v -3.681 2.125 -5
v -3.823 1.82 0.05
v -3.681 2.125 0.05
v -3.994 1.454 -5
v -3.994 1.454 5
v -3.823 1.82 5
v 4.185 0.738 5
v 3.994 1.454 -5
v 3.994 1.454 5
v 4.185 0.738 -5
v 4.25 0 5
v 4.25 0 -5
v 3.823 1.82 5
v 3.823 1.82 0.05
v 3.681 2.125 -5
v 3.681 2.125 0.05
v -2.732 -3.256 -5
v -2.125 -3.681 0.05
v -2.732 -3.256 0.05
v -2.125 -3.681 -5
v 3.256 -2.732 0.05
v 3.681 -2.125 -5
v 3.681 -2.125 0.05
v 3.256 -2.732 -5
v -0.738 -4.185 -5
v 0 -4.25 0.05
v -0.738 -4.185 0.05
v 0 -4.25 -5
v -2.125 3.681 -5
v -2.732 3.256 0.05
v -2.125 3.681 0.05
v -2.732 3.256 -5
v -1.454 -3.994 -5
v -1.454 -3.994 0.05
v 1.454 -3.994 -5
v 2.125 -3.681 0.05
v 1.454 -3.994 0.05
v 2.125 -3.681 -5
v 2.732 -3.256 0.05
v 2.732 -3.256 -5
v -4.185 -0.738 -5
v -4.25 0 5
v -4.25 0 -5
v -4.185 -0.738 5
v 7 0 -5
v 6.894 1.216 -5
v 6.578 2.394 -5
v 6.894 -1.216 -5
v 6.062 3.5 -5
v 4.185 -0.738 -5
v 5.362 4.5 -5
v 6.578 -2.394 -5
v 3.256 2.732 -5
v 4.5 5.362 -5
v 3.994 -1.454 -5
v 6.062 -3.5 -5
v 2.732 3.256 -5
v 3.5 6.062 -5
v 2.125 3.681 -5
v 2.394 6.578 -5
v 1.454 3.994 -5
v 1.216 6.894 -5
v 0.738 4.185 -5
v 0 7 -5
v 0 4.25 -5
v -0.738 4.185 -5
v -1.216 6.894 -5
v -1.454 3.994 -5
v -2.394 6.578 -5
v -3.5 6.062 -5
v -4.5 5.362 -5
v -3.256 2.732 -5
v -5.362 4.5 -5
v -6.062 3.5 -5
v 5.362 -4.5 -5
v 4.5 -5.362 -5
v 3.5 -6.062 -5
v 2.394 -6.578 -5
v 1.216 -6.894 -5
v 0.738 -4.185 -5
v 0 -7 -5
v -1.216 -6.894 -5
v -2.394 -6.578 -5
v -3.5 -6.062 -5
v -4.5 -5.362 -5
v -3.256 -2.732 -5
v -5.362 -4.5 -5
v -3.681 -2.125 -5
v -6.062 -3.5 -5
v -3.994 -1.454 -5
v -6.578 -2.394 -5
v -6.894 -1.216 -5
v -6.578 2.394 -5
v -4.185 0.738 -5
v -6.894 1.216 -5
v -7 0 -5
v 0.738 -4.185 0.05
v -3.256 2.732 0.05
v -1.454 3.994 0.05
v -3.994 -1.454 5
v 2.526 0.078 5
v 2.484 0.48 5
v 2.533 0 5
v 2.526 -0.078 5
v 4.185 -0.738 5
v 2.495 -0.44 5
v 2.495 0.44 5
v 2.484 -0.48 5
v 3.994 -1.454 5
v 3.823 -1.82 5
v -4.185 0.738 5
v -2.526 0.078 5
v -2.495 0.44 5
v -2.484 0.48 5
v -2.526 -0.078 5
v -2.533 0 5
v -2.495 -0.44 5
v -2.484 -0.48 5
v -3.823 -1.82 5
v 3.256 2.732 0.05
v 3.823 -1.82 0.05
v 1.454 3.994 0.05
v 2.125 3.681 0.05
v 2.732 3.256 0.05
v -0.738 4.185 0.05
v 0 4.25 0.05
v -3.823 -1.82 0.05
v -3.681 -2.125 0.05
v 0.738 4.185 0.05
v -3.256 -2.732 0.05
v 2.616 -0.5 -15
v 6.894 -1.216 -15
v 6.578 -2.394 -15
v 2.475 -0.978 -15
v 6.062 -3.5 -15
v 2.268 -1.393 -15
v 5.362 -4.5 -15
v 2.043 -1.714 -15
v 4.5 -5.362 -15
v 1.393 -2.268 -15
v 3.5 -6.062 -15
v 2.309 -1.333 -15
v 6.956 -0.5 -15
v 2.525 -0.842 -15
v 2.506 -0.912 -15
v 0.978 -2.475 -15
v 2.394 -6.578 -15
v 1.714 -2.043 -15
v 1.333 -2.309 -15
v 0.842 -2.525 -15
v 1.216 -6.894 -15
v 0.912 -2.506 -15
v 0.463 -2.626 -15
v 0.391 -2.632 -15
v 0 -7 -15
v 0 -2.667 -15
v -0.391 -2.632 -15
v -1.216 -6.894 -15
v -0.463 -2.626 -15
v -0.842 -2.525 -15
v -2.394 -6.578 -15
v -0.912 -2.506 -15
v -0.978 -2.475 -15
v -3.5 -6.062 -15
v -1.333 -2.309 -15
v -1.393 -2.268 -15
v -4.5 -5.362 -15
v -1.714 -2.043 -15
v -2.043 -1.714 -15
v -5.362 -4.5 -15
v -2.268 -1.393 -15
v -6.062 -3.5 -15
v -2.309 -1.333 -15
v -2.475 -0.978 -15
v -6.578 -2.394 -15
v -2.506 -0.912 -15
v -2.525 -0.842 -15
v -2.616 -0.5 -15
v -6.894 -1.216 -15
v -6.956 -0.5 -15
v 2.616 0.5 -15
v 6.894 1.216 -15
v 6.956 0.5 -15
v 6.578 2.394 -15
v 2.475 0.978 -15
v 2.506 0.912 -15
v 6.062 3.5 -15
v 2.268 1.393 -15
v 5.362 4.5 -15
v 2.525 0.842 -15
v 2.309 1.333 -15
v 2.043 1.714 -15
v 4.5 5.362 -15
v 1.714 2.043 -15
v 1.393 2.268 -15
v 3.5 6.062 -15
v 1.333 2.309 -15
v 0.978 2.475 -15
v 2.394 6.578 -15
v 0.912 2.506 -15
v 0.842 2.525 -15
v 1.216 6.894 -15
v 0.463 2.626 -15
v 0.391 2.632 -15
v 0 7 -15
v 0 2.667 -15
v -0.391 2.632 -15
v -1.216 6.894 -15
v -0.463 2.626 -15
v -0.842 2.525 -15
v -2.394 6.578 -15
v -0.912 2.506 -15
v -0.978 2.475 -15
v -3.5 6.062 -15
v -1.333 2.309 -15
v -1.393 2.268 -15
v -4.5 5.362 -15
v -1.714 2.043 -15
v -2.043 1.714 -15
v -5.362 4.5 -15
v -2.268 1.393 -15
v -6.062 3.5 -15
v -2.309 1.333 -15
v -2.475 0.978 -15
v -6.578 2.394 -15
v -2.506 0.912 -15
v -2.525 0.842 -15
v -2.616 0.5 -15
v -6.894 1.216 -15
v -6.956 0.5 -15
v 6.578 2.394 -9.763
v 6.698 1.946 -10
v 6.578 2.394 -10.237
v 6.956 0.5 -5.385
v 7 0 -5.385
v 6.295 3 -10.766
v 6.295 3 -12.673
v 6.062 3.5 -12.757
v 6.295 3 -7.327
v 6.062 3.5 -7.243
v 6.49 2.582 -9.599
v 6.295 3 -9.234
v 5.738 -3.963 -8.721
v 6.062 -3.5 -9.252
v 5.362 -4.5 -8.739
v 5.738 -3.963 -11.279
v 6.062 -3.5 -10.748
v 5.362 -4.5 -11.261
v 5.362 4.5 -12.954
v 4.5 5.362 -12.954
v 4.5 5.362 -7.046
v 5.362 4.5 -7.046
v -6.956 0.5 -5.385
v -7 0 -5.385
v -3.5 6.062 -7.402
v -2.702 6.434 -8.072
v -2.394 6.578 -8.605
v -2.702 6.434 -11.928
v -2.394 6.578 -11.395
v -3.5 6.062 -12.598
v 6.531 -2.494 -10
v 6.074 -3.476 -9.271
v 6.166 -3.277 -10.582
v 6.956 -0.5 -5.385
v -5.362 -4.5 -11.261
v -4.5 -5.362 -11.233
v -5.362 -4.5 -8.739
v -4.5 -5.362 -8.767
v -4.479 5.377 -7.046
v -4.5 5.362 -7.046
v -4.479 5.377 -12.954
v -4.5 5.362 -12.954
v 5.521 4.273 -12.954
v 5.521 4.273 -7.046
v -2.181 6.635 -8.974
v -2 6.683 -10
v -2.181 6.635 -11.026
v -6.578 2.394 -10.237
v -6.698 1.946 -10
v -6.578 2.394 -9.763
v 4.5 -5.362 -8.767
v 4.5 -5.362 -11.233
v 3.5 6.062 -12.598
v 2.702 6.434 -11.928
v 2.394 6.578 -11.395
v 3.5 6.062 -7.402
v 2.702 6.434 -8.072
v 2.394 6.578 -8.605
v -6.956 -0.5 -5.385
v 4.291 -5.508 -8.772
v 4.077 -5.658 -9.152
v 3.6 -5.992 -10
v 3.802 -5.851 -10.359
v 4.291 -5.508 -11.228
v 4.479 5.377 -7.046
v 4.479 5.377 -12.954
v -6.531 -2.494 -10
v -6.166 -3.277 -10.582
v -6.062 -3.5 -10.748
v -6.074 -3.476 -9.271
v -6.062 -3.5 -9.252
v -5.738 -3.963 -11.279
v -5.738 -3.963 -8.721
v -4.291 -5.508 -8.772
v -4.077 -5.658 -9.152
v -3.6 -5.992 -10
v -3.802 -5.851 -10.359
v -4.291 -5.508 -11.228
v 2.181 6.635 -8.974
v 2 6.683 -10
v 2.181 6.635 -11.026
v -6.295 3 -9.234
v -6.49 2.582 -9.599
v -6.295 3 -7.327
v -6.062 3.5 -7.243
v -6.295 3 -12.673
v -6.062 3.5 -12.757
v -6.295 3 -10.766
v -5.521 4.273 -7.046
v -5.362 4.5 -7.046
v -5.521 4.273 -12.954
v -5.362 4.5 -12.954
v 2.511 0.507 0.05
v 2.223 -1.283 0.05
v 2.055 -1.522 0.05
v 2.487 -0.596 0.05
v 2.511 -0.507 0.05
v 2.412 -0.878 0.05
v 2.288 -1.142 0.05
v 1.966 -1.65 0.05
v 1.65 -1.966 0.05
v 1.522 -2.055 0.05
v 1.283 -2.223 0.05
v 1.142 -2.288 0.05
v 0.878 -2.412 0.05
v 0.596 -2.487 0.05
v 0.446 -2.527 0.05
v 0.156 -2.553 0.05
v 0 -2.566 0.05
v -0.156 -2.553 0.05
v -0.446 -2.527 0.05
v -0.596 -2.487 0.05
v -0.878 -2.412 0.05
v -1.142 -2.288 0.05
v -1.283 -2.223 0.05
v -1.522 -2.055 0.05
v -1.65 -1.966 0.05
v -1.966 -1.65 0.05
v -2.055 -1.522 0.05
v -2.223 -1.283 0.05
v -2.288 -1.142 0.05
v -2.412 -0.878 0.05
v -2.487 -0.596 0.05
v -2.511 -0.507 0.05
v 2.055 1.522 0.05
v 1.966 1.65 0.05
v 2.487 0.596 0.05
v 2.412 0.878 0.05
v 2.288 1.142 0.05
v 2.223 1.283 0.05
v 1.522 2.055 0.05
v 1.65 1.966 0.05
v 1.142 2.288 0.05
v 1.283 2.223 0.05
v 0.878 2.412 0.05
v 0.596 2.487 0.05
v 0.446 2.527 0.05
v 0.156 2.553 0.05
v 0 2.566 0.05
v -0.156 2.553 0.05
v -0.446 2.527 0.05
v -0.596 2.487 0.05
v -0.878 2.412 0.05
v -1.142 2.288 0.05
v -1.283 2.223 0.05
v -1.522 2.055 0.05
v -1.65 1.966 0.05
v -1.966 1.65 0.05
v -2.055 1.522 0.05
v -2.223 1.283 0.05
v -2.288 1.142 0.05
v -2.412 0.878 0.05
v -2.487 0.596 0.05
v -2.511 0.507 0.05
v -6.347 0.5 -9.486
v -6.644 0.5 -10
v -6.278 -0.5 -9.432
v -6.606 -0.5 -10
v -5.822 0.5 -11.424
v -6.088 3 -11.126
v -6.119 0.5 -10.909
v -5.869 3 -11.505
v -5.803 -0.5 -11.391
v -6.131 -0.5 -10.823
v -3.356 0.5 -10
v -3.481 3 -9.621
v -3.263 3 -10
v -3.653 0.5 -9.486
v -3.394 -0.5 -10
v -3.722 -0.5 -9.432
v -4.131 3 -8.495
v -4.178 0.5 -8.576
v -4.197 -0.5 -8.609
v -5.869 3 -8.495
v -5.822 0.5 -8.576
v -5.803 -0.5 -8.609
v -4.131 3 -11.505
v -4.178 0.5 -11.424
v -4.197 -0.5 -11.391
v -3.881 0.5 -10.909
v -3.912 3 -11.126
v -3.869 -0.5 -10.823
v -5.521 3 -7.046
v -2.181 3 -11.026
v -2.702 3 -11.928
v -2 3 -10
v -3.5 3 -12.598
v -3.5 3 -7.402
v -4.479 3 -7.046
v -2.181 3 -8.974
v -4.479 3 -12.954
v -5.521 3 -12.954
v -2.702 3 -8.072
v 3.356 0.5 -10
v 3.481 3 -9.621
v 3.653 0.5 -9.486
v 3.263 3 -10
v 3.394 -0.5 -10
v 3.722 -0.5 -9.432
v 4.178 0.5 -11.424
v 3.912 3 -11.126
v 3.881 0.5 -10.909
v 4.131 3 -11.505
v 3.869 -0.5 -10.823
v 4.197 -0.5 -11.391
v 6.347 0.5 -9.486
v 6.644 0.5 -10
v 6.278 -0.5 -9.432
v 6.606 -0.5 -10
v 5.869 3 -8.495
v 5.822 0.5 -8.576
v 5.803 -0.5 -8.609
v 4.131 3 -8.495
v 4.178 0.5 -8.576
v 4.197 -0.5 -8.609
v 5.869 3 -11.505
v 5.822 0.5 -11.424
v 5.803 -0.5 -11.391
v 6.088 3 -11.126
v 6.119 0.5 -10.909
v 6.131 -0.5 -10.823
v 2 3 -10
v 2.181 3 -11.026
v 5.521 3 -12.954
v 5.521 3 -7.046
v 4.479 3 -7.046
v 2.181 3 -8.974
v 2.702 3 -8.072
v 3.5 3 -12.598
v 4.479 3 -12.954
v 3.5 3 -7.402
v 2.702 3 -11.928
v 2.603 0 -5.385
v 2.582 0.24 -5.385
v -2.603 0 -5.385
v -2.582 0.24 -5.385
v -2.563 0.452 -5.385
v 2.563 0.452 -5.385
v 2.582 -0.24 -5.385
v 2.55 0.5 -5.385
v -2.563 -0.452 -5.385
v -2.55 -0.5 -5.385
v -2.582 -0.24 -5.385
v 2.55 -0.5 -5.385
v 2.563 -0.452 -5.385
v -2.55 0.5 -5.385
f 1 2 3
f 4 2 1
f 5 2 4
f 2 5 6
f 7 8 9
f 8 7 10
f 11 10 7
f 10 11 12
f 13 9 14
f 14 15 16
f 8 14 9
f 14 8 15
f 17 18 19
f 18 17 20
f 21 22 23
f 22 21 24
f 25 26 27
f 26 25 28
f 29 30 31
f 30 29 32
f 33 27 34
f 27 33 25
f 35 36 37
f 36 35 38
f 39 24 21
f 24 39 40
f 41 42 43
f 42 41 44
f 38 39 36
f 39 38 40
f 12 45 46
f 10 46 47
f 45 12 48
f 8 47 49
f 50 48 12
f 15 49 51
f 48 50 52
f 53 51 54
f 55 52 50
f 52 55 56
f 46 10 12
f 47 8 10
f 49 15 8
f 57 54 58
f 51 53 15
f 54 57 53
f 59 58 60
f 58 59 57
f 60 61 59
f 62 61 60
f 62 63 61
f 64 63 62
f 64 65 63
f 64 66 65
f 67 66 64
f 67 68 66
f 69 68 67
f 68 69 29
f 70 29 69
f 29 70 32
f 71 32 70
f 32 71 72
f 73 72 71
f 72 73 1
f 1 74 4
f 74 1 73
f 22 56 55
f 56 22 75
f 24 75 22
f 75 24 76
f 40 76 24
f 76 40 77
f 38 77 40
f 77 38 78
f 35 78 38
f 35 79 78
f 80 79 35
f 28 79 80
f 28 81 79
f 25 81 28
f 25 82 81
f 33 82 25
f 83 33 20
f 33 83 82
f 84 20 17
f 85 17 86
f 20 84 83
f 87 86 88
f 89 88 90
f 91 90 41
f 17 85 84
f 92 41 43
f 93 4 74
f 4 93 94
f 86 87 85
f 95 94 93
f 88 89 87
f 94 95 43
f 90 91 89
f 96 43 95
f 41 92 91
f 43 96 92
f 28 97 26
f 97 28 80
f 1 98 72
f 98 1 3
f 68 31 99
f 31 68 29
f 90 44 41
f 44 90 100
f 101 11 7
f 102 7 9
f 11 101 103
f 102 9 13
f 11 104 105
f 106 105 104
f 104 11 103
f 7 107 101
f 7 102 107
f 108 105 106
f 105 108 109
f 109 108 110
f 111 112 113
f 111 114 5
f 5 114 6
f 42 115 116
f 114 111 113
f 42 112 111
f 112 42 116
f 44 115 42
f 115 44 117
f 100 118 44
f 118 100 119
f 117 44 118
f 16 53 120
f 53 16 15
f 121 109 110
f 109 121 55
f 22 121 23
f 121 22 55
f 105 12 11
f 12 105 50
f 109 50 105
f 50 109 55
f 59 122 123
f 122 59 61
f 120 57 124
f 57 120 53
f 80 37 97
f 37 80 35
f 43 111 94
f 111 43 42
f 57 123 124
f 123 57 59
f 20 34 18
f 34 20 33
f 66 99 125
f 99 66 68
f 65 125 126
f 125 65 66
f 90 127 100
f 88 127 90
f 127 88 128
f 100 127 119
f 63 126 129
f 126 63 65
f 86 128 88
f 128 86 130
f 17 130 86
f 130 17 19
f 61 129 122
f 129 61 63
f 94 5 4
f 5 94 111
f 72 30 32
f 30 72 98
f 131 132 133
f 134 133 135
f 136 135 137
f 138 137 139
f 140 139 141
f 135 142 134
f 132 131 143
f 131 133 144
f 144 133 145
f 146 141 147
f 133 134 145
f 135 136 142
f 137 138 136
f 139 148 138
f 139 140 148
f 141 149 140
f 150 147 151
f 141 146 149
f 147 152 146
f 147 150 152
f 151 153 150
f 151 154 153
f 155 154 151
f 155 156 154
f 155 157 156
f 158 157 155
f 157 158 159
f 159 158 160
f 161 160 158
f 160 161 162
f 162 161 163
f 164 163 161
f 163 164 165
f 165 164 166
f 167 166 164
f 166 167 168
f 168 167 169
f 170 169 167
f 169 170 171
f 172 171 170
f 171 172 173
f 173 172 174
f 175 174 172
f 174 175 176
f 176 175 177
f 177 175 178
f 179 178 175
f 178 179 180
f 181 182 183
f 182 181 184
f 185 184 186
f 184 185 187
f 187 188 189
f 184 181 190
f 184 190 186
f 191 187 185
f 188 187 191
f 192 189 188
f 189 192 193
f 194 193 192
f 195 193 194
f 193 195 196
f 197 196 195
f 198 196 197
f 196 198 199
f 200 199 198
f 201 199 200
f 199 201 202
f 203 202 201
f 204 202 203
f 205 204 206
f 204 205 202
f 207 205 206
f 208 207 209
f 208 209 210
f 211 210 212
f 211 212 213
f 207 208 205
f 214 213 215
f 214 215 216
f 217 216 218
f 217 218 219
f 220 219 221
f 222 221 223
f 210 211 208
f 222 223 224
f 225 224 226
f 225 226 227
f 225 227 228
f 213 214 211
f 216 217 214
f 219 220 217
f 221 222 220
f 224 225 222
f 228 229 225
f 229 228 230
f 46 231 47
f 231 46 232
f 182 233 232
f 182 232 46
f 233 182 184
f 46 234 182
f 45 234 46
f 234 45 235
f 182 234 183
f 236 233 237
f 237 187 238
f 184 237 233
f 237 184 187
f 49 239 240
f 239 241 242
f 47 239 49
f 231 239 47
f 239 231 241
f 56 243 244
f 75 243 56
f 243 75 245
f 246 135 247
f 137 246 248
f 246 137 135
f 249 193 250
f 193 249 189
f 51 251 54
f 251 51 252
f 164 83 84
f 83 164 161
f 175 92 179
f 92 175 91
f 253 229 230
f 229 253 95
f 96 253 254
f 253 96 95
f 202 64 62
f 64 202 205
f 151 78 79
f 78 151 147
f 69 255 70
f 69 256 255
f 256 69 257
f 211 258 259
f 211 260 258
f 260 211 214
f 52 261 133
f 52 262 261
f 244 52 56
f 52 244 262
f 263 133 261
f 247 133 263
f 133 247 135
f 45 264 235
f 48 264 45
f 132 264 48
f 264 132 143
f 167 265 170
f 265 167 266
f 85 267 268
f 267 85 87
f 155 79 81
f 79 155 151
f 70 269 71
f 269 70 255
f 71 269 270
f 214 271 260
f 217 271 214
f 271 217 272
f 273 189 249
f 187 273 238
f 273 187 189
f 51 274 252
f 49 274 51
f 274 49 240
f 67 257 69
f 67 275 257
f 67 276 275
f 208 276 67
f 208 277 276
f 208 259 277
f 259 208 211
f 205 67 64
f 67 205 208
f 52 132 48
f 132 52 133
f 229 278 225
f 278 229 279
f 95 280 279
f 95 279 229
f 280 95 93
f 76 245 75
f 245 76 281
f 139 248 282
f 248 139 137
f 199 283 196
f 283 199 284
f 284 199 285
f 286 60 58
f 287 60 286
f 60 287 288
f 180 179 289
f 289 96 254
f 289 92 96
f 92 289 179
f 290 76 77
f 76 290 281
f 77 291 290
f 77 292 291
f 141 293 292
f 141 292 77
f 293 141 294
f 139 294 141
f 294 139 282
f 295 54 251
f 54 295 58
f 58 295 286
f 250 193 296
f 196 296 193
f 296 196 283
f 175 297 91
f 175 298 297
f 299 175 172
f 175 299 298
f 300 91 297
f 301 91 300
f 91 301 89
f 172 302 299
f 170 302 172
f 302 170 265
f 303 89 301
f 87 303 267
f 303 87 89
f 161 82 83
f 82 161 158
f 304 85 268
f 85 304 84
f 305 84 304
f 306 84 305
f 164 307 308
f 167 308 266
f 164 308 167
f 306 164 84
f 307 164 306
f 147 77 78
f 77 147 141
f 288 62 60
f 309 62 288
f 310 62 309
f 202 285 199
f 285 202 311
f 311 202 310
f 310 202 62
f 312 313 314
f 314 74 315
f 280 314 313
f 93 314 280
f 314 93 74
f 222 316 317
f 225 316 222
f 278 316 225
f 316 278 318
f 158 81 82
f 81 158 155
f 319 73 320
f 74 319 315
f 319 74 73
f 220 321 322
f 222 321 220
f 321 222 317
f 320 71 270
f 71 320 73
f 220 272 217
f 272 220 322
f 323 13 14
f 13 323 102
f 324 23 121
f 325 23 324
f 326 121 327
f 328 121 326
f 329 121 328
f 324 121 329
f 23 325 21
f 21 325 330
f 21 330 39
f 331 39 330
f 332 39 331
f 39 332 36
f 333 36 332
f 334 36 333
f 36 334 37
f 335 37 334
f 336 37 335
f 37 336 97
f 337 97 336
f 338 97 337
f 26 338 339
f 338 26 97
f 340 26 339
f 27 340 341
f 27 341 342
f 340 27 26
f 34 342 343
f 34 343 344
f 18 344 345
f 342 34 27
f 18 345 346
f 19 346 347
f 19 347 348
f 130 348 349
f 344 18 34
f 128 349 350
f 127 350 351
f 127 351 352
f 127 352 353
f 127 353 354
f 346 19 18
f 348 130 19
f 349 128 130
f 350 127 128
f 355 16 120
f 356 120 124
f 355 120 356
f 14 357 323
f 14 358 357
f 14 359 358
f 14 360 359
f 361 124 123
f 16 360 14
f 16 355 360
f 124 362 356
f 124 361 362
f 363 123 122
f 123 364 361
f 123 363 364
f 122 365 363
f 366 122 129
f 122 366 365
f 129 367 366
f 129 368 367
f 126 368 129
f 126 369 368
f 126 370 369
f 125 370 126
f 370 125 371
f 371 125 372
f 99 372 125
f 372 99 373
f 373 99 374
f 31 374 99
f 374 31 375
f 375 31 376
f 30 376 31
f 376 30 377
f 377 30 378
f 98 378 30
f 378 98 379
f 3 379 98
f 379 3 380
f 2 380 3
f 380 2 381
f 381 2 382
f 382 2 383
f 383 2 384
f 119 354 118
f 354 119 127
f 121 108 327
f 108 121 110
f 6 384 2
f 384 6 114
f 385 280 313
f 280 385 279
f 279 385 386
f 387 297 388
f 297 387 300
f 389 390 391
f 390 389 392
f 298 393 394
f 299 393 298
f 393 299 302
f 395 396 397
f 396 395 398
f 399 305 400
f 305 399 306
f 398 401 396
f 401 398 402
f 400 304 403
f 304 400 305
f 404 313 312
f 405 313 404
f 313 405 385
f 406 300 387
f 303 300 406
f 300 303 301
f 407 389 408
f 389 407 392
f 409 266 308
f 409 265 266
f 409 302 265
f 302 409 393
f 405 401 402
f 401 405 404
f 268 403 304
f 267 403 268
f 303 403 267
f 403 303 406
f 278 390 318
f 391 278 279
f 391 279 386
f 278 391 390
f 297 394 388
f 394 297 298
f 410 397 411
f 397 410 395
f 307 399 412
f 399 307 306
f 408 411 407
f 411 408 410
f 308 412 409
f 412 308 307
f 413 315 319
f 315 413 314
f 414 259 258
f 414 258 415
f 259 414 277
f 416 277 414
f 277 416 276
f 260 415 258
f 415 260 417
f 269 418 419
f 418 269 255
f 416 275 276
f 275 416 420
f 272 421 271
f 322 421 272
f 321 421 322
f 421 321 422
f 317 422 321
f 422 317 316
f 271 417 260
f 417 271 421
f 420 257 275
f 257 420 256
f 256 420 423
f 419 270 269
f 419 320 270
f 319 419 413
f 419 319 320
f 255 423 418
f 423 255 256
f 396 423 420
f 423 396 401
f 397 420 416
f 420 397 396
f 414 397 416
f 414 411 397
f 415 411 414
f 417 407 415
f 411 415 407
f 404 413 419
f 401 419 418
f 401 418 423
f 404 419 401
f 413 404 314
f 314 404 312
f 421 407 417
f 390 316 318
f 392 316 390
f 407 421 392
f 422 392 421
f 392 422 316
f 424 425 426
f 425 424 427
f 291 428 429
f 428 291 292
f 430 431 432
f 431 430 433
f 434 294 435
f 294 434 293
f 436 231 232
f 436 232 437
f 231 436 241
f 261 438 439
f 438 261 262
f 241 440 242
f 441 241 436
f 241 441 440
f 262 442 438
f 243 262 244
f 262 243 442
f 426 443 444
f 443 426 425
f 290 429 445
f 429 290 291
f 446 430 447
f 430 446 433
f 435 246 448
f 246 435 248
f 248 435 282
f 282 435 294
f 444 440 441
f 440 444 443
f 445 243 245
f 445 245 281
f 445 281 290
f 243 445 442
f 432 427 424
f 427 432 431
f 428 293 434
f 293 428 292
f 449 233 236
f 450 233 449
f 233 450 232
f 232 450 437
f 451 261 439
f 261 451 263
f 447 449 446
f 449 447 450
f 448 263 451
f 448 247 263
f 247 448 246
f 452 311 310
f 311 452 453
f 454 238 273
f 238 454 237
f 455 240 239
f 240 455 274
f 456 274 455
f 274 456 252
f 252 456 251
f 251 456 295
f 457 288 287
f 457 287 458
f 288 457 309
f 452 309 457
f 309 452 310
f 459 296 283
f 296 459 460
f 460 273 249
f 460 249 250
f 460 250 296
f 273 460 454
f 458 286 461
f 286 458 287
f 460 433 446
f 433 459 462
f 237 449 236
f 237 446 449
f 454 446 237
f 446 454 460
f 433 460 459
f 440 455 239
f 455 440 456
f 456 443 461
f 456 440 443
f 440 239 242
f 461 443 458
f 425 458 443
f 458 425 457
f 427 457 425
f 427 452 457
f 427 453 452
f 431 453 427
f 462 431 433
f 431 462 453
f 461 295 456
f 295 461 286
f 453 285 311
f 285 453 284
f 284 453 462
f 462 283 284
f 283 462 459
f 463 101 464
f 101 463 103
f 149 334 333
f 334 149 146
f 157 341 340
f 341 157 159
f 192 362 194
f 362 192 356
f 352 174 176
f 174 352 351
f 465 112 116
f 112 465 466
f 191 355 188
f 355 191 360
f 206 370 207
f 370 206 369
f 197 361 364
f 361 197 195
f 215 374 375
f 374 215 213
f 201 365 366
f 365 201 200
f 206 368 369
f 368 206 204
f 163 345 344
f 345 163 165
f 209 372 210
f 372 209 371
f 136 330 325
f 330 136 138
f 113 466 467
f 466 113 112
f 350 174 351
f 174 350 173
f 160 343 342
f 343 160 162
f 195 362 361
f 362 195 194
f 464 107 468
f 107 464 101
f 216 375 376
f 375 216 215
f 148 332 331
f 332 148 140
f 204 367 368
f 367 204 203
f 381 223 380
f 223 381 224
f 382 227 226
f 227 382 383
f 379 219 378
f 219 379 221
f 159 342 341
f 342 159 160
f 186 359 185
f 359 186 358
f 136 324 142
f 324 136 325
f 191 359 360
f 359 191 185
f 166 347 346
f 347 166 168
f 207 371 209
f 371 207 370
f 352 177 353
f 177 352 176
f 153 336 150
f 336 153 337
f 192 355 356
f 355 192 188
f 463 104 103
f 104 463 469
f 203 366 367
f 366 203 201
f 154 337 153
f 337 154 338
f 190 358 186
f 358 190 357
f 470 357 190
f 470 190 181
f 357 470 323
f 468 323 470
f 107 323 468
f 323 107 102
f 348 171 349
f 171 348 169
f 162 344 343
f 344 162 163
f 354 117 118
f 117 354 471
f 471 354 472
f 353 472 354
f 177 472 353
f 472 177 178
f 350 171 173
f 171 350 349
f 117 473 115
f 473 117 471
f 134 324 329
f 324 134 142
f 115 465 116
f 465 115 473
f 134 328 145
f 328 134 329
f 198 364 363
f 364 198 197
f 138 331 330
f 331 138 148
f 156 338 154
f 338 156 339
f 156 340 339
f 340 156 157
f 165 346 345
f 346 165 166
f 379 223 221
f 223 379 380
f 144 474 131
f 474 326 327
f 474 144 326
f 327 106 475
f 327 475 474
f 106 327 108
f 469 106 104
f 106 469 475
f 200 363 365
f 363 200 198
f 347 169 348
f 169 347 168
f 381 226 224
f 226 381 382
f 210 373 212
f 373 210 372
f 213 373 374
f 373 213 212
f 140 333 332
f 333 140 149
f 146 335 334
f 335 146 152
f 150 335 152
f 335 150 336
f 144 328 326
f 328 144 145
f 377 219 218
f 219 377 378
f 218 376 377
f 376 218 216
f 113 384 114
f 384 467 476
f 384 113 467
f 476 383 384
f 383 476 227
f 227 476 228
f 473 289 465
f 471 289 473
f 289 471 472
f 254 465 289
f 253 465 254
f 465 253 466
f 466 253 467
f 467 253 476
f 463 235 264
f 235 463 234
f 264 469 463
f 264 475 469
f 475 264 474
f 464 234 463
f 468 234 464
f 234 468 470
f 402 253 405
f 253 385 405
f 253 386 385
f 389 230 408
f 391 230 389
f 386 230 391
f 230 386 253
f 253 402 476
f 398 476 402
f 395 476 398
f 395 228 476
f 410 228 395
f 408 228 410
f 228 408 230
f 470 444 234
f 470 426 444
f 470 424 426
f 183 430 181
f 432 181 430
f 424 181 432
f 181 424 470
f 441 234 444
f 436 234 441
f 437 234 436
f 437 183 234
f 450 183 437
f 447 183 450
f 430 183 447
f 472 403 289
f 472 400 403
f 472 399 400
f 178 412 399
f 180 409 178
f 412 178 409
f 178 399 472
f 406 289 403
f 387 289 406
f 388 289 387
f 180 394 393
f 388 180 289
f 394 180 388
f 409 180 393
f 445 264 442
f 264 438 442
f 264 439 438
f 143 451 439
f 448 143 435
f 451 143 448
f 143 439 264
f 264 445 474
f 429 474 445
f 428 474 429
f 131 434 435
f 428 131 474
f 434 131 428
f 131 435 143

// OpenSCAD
//my own special spider coupling!
//this is a special spider coupling meant to fit into a (extruded) aluminium tube, initially with ID of ~10

ID=9.5;
Height=20;
Base=20;
tol=0.05;


module topLock(Radius=5)
{
	translate([0,0,0])
	{
		difference()
		{
			union()
			{
				translate([0,0,Height/2 + 1])
					cylinder(r=Radius, h= Height/2, $fn=36);
				translate([0,0,Height/2])
					cylinder(r1=Radius-0.7, r2 = Radius, h=1, $fn=36);	
			}
			//tapered hole for M3 bolt to lock the spider in place
			translate([0,0,Height/2])
				cylinder(r1=1.6, r2=1.2, h= Height/2 +1 , $fn=36);
		}
	}	
}

module topCross(Radius=5)
{
	translate([0,0,0])
	{
		difference()
		{
			union()
			{
				translate([0,0,0])
					cylinder(r=Radius, h= Height/2-1, $fn=36);
				translate([0,0,Height/2-1])
					cylinder(r2=Radius-0.7, r1 = Radius, h=1, $fn=36);	
			}
			//tapered hole for M3 bolt to lock the spider in place
			translate([0,0,0])
				cylinder(r=1.7, h= Height/2 +1 , $fn=36);
			translate([0,0,0])
				cylinder(r=3, h=Height/2 -1, $fn=36);
			//one half of cross
			for (i=[-1,1])
			{
				//translate([2*i*Radius/3,0,0])
				rotate([0,0,i*45])
					cube([2*Radius/3,2*Radius, Height/2 ], center=true );
			}
			cube([2*Radius, Radius, Height/2 ], center=true);
		}
	}
}

module bottomCross(Radius=4.5)
{
	translate([0,0,0])
	{
		difference()
		{
			union()
			{
				translate([0,0,-Height/4])
					cylinder(r=Radius, h= Height/2, $fn=36);
				translate([0,0,-Height/4 -10])
					cylinder(r=7, h= 10, $fn=36);	
			}
			//hole for 5mm axis on stepper
			translate([0,0,-Height/2 -10])
				cylinder(r1=2.7, r2=2.5 ,h= Height +10 , $fn=36);
			//one half of cross
			for (i=[-1,1])
			{
				translate([0,0,Height/8 + tol])
				rotate([0,0,i*45])
					cube([2*Radius/3,2*Radius, Height/4 ], center=true );
			}
			translate([0,0,Height/8 + tol ])
				cube([Radius, 2*Radius, Height/4 ], center=true);
			translate([0,0,-Height/1.3])
				cube([Base, 0.05* Base, Height], center=true);	
			for (i=[-1,1])
			{
				translate([i*Base/4,0,-Height/2])
					rotate([90,0,0])
						cylinder(r1=2, r2=1.25, h=Base, center=true, $fn=6);

				#translate([i*Base/4,3,-Height/2])
					rotate([-90,0,0])
						cylinder(r=3, h=6, , $fn=18);
			}			
		}
	}
}

//topLock(ID/2);
//topCross(ID/2);
bottomCross(ID/2-0.5);
